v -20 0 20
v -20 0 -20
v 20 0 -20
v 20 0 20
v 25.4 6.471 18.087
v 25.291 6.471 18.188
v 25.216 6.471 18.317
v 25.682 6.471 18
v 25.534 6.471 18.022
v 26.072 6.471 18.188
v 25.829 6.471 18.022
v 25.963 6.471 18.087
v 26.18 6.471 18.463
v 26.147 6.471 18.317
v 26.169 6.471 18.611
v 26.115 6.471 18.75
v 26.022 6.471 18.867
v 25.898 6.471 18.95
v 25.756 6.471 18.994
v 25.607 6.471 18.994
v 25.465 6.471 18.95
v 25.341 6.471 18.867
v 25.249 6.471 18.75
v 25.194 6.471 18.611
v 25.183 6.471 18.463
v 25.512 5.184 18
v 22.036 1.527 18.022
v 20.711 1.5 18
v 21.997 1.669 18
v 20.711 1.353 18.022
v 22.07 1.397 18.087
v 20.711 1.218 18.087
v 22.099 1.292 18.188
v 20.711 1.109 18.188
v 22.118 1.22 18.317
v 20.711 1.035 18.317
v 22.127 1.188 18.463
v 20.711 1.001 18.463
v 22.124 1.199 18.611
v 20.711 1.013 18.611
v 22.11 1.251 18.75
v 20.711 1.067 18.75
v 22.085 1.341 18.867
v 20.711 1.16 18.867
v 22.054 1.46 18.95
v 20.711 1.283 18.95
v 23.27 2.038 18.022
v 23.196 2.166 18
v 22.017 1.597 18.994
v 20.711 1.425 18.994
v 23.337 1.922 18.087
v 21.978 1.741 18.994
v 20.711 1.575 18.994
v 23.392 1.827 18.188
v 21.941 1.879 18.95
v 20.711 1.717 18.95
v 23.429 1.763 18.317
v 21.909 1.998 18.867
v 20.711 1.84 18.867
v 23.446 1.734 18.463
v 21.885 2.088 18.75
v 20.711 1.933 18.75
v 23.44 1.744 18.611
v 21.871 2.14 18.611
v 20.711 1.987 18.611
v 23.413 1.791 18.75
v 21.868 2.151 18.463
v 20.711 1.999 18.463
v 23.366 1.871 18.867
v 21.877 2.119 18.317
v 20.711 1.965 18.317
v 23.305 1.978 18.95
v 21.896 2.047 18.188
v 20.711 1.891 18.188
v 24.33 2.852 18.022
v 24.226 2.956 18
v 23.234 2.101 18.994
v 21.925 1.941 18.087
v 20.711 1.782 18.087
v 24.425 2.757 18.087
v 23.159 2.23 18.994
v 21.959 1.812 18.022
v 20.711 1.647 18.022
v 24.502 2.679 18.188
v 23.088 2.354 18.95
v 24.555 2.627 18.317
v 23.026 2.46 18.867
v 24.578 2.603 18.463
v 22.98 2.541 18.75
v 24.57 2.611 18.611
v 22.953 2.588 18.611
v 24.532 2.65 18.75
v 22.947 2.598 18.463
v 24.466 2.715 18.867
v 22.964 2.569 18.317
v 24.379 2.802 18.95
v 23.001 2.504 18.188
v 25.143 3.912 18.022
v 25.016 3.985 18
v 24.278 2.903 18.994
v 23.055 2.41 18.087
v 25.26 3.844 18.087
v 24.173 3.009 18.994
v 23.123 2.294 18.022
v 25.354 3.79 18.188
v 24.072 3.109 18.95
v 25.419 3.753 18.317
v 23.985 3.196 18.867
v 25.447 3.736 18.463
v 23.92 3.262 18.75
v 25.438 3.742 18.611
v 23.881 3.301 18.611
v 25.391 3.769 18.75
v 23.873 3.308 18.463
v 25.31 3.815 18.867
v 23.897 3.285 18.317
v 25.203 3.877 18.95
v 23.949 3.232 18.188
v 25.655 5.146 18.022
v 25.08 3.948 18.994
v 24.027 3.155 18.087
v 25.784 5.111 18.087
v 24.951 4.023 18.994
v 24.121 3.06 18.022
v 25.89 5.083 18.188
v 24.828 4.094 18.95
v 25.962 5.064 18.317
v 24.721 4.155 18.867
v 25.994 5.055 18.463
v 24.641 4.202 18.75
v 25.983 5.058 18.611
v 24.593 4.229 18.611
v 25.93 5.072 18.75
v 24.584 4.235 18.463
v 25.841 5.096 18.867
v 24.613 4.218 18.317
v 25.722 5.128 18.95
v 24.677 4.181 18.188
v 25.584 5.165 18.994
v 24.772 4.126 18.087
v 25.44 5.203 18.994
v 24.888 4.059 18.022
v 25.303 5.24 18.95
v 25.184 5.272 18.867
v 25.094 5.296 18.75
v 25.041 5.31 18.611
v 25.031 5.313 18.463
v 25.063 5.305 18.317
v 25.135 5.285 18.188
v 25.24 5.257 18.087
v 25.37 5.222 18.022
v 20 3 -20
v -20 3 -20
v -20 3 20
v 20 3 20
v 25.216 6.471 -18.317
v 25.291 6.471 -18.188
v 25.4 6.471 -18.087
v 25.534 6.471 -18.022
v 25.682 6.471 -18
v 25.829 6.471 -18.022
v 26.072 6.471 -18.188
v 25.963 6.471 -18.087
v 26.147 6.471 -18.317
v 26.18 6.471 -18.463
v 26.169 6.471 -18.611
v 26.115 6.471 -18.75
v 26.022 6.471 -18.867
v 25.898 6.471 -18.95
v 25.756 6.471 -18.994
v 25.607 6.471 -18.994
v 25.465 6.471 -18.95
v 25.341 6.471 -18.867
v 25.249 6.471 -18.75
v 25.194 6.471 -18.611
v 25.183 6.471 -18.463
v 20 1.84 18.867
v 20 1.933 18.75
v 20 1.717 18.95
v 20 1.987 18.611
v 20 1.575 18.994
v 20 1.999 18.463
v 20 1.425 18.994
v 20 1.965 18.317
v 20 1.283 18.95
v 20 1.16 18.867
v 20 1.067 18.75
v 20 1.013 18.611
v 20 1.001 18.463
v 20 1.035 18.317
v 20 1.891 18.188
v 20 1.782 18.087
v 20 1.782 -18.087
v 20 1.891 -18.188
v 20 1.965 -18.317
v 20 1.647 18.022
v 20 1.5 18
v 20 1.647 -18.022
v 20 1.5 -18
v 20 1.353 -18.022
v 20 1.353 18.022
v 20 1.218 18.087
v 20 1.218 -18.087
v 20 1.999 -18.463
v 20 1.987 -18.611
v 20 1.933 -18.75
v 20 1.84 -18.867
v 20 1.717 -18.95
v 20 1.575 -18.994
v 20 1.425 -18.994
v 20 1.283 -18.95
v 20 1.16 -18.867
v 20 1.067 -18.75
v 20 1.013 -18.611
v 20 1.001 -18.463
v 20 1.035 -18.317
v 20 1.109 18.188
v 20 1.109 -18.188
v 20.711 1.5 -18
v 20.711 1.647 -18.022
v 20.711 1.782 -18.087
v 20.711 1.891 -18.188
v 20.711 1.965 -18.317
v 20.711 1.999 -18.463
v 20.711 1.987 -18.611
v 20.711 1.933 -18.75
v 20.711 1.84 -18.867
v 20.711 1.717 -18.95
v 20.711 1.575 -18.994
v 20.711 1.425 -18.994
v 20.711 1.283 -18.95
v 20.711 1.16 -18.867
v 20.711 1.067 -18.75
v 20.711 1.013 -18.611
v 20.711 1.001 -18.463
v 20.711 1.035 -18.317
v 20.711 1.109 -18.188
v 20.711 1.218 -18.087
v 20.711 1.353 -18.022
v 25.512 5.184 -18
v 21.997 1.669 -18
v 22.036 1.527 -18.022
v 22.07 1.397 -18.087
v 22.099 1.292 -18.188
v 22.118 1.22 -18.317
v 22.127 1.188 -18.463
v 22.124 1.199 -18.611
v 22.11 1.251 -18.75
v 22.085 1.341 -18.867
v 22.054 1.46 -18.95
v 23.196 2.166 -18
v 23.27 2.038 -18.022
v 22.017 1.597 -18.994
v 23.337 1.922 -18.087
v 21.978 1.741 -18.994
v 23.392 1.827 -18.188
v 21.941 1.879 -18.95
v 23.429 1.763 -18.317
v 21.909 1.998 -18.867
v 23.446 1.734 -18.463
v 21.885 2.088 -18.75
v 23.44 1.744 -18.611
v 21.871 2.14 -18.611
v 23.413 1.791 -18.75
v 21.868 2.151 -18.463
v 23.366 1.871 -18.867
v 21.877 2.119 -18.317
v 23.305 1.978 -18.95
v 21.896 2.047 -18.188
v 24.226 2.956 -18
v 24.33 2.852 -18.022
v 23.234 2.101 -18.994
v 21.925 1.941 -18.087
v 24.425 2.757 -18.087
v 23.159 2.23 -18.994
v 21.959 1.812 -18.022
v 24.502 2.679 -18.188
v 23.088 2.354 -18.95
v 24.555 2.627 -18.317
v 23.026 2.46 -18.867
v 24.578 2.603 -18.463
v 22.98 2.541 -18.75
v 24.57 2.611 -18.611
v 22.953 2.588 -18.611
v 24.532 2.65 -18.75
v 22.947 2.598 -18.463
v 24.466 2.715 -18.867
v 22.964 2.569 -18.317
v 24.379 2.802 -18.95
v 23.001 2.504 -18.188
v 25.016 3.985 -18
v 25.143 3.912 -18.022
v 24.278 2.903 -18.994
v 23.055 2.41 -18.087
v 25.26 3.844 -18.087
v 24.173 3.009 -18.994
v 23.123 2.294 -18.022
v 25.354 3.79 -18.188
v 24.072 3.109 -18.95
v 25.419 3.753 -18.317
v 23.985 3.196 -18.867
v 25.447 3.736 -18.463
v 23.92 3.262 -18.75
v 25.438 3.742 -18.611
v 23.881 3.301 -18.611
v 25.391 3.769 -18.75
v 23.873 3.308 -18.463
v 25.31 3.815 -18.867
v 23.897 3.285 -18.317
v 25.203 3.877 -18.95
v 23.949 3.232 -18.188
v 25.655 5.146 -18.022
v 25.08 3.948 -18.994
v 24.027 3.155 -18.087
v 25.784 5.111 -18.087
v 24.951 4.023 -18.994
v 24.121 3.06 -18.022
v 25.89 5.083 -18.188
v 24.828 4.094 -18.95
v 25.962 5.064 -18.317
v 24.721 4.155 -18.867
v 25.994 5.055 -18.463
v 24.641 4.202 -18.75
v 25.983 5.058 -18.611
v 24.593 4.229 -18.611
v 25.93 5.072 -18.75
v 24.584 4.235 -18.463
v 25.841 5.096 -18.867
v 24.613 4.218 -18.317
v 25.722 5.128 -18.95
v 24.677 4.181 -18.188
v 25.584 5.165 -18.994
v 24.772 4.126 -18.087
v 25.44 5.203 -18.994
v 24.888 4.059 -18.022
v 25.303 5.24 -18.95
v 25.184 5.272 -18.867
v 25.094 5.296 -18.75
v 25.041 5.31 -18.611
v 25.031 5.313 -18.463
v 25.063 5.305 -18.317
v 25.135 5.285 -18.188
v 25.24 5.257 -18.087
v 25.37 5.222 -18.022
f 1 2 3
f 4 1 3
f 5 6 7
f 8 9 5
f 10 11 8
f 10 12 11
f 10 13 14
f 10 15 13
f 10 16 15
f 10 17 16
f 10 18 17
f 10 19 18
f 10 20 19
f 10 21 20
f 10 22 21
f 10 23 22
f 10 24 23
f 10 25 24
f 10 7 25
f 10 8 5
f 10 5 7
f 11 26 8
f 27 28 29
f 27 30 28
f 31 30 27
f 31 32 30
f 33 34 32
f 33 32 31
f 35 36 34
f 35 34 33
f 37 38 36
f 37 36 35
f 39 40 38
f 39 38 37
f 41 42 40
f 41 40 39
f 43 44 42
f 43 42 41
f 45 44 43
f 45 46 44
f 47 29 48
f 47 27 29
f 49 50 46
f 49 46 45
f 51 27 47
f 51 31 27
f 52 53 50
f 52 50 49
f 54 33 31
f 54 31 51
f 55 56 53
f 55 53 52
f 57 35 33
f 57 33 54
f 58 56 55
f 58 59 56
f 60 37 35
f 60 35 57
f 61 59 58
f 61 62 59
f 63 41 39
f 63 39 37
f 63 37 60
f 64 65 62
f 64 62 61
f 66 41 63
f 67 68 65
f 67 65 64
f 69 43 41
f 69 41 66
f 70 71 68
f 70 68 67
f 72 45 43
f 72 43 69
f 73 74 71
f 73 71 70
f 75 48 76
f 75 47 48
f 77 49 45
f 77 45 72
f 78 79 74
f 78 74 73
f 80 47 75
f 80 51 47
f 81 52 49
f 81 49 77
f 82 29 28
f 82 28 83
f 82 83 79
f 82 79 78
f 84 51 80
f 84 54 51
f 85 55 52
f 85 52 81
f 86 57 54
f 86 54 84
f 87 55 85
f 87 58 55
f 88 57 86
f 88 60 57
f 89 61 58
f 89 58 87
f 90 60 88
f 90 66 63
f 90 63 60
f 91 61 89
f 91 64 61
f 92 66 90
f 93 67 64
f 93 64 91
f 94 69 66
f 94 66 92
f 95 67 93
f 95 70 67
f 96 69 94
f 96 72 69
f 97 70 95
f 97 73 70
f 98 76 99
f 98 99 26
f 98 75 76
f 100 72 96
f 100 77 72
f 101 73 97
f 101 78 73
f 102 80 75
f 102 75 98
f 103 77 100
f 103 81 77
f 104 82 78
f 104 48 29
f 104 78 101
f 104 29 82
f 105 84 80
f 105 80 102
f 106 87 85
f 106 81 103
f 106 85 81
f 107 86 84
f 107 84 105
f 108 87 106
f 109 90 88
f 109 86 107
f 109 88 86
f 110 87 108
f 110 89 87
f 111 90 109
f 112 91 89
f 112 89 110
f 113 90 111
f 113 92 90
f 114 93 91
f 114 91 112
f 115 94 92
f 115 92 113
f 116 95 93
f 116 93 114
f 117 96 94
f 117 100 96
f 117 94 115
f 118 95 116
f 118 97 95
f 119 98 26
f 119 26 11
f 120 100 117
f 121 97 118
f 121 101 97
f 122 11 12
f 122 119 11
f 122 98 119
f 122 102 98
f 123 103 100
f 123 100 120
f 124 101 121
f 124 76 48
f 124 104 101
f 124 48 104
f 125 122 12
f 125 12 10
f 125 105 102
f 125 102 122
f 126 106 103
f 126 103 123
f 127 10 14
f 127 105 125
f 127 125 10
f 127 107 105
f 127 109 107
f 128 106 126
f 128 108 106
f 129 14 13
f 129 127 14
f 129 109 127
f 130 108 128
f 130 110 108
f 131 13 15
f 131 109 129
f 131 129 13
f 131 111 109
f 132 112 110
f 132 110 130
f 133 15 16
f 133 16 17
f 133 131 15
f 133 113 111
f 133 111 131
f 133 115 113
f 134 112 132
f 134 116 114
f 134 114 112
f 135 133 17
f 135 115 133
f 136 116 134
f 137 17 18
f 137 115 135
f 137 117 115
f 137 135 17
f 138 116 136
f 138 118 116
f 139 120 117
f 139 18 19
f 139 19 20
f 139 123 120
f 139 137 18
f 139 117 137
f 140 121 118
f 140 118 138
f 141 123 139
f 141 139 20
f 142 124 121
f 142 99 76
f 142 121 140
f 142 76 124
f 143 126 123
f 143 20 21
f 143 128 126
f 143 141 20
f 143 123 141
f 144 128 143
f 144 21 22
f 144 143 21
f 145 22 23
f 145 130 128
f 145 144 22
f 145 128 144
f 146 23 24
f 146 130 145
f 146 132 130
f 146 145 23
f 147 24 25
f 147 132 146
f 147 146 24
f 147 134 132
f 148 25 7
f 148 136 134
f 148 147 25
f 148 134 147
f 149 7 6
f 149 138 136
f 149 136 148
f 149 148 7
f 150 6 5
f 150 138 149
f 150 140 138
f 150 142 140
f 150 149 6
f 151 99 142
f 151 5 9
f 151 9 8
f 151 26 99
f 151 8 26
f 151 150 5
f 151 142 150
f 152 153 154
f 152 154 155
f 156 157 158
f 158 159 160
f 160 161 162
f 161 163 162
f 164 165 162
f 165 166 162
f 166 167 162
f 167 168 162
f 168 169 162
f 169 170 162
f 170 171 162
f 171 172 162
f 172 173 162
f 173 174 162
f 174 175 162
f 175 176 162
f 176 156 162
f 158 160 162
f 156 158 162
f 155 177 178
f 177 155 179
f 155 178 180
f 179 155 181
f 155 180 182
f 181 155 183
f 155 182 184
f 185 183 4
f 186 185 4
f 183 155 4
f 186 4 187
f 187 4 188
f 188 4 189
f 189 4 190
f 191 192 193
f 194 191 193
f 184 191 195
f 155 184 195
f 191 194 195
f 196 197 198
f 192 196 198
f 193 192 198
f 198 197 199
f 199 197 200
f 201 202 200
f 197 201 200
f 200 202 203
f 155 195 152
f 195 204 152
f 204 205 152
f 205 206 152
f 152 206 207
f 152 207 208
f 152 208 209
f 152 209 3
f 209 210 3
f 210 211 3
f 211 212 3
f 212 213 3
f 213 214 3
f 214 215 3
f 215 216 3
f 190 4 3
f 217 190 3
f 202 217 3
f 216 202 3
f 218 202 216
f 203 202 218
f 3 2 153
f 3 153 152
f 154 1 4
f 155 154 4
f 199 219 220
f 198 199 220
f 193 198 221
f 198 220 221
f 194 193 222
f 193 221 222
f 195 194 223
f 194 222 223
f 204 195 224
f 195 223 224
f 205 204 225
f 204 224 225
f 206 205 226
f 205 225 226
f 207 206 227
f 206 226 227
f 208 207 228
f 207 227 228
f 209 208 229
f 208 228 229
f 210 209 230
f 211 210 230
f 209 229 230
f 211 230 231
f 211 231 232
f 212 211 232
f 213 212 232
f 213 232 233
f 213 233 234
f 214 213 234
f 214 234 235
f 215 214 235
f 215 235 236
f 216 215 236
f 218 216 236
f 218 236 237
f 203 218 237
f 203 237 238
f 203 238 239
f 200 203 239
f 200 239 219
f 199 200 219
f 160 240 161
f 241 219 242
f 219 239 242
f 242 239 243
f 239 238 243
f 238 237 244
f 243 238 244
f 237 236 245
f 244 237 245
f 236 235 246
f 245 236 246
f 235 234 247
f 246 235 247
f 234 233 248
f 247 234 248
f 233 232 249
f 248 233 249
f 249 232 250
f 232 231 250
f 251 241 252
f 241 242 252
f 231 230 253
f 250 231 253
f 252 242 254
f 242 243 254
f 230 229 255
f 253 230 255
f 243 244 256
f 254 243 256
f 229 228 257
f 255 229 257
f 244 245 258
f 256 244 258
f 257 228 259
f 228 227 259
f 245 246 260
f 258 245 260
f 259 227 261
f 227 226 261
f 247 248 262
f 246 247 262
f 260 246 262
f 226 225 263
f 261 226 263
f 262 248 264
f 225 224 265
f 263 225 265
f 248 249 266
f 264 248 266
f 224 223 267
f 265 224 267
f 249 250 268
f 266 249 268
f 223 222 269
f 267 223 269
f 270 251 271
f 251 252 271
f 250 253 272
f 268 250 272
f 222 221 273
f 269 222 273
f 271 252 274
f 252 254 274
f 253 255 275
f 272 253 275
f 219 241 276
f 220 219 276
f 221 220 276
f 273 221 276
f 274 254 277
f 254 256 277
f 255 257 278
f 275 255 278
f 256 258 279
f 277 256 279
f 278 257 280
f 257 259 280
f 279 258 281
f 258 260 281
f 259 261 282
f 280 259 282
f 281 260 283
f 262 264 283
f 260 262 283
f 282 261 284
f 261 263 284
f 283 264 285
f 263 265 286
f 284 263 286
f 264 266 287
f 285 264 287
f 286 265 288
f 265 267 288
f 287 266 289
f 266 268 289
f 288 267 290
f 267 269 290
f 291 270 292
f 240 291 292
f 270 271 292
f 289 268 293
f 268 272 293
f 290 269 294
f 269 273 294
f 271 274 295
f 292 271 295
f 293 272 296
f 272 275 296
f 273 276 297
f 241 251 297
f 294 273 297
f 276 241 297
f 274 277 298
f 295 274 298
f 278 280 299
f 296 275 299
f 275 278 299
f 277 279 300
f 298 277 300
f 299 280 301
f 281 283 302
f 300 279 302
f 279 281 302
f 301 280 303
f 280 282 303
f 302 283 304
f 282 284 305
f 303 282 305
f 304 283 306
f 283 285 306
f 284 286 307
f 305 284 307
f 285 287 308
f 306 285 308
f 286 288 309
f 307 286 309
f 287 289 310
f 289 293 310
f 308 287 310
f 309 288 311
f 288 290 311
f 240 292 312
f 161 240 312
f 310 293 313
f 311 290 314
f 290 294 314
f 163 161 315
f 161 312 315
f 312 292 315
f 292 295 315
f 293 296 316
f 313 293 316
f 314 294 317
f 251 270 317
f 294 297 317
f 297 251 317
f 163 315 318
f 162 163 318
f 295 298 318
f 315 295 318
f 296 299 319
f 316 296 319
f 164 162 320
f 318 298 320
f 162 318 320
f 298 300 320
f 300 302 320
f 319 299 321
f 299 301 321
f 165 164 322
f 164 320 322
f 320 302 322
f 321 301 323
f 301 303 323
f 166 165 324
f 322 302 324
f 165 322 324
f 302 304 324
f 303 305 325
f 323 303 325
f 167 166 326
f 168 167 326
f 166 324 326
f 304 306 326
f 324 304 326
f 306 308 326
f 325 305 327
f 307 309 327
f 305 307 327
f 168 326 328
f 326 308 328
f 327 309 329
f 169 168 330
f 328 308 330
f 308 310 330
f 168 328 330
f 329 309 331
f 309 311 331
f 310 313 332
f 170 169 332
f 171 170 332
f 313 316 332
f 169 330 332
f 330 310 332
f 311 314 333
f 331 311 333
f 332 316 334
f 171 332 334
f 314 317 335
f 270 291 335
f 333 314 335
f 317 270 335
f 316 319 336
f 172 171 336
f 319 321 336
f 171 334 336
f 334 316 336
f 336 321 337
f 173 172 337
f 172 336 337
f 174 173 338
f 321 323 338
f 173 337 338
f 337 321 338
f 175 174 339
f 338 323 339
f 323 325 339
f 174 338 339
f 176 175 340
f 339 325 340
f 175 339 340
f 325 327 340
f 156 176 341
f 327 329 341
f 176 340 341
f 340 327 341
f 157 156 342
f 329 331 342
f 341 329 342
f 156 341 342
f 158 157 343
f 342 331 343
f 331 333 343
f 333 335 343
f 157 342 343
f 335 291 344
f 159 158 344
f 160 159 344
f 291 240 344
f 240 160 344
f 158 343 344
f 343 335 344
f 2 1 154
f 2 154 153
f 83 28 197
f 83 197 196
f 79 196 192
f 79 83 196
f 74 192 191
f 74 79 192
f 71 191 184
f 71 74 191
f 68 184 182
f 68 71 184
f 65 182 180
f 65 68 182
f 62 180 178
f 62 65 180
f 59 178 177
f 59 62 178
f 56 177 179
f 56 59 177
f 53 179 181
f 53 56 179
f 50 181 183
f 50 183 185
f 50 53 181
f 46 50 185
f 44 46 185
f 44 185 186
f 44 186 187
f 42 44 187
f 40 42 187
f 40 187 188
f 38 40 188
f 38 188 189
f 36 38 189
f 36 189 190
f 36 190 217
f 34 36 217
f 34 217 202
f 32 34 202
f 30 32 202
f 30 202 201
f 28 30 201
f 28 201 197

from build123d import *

# Parameters (mm, degrees)
SKETCH1_W           = 40
SKETCH1_H           = 40
BOSS_EXTRUDE1_DEPTH = 3
SKETCH2_R           = 0.5


with BuildPart() as part:
    # Sketch1 → Boss-Extrude1 (new body)
    with BuildSketch(Plane(origin=(0, 0, 0), x_dir=(1, 0, 0), z_dir=(0, 1, 0))):
        Rectangle(SKETCH1_W, SKETCH1_H)
    extrude(amount=BOSS_EXTRUDE1_DEPTH)

    # Sweep1: sweep along a path in Sketch3
    with BuildLine(Plane.XY.offset(18.5)) as sweep1_path:
        Line((20, 1.5), (20.711014952, 1.5))
        ThreePointArc((20.711014952, 1.5), (24.225698973, 2.955829789), (25.681528762, 6.47051381))
    # Sketch2 → Sweep1 (sweep)
    with BuildSketch(Plane(origin=(20, 0, 0), x_dir=(0, 0, -1), z_dir=(1, 0, 0))):
        with Locations((-18.5, 1.5)):
            Circle(SKETCH2_R)
    sweep1 = sweep(path=sweep1_path.line)

    # Mirror1: Sweep1 across plane
    add(sweep1.mirror(Plane.XY))


solid = part.part
